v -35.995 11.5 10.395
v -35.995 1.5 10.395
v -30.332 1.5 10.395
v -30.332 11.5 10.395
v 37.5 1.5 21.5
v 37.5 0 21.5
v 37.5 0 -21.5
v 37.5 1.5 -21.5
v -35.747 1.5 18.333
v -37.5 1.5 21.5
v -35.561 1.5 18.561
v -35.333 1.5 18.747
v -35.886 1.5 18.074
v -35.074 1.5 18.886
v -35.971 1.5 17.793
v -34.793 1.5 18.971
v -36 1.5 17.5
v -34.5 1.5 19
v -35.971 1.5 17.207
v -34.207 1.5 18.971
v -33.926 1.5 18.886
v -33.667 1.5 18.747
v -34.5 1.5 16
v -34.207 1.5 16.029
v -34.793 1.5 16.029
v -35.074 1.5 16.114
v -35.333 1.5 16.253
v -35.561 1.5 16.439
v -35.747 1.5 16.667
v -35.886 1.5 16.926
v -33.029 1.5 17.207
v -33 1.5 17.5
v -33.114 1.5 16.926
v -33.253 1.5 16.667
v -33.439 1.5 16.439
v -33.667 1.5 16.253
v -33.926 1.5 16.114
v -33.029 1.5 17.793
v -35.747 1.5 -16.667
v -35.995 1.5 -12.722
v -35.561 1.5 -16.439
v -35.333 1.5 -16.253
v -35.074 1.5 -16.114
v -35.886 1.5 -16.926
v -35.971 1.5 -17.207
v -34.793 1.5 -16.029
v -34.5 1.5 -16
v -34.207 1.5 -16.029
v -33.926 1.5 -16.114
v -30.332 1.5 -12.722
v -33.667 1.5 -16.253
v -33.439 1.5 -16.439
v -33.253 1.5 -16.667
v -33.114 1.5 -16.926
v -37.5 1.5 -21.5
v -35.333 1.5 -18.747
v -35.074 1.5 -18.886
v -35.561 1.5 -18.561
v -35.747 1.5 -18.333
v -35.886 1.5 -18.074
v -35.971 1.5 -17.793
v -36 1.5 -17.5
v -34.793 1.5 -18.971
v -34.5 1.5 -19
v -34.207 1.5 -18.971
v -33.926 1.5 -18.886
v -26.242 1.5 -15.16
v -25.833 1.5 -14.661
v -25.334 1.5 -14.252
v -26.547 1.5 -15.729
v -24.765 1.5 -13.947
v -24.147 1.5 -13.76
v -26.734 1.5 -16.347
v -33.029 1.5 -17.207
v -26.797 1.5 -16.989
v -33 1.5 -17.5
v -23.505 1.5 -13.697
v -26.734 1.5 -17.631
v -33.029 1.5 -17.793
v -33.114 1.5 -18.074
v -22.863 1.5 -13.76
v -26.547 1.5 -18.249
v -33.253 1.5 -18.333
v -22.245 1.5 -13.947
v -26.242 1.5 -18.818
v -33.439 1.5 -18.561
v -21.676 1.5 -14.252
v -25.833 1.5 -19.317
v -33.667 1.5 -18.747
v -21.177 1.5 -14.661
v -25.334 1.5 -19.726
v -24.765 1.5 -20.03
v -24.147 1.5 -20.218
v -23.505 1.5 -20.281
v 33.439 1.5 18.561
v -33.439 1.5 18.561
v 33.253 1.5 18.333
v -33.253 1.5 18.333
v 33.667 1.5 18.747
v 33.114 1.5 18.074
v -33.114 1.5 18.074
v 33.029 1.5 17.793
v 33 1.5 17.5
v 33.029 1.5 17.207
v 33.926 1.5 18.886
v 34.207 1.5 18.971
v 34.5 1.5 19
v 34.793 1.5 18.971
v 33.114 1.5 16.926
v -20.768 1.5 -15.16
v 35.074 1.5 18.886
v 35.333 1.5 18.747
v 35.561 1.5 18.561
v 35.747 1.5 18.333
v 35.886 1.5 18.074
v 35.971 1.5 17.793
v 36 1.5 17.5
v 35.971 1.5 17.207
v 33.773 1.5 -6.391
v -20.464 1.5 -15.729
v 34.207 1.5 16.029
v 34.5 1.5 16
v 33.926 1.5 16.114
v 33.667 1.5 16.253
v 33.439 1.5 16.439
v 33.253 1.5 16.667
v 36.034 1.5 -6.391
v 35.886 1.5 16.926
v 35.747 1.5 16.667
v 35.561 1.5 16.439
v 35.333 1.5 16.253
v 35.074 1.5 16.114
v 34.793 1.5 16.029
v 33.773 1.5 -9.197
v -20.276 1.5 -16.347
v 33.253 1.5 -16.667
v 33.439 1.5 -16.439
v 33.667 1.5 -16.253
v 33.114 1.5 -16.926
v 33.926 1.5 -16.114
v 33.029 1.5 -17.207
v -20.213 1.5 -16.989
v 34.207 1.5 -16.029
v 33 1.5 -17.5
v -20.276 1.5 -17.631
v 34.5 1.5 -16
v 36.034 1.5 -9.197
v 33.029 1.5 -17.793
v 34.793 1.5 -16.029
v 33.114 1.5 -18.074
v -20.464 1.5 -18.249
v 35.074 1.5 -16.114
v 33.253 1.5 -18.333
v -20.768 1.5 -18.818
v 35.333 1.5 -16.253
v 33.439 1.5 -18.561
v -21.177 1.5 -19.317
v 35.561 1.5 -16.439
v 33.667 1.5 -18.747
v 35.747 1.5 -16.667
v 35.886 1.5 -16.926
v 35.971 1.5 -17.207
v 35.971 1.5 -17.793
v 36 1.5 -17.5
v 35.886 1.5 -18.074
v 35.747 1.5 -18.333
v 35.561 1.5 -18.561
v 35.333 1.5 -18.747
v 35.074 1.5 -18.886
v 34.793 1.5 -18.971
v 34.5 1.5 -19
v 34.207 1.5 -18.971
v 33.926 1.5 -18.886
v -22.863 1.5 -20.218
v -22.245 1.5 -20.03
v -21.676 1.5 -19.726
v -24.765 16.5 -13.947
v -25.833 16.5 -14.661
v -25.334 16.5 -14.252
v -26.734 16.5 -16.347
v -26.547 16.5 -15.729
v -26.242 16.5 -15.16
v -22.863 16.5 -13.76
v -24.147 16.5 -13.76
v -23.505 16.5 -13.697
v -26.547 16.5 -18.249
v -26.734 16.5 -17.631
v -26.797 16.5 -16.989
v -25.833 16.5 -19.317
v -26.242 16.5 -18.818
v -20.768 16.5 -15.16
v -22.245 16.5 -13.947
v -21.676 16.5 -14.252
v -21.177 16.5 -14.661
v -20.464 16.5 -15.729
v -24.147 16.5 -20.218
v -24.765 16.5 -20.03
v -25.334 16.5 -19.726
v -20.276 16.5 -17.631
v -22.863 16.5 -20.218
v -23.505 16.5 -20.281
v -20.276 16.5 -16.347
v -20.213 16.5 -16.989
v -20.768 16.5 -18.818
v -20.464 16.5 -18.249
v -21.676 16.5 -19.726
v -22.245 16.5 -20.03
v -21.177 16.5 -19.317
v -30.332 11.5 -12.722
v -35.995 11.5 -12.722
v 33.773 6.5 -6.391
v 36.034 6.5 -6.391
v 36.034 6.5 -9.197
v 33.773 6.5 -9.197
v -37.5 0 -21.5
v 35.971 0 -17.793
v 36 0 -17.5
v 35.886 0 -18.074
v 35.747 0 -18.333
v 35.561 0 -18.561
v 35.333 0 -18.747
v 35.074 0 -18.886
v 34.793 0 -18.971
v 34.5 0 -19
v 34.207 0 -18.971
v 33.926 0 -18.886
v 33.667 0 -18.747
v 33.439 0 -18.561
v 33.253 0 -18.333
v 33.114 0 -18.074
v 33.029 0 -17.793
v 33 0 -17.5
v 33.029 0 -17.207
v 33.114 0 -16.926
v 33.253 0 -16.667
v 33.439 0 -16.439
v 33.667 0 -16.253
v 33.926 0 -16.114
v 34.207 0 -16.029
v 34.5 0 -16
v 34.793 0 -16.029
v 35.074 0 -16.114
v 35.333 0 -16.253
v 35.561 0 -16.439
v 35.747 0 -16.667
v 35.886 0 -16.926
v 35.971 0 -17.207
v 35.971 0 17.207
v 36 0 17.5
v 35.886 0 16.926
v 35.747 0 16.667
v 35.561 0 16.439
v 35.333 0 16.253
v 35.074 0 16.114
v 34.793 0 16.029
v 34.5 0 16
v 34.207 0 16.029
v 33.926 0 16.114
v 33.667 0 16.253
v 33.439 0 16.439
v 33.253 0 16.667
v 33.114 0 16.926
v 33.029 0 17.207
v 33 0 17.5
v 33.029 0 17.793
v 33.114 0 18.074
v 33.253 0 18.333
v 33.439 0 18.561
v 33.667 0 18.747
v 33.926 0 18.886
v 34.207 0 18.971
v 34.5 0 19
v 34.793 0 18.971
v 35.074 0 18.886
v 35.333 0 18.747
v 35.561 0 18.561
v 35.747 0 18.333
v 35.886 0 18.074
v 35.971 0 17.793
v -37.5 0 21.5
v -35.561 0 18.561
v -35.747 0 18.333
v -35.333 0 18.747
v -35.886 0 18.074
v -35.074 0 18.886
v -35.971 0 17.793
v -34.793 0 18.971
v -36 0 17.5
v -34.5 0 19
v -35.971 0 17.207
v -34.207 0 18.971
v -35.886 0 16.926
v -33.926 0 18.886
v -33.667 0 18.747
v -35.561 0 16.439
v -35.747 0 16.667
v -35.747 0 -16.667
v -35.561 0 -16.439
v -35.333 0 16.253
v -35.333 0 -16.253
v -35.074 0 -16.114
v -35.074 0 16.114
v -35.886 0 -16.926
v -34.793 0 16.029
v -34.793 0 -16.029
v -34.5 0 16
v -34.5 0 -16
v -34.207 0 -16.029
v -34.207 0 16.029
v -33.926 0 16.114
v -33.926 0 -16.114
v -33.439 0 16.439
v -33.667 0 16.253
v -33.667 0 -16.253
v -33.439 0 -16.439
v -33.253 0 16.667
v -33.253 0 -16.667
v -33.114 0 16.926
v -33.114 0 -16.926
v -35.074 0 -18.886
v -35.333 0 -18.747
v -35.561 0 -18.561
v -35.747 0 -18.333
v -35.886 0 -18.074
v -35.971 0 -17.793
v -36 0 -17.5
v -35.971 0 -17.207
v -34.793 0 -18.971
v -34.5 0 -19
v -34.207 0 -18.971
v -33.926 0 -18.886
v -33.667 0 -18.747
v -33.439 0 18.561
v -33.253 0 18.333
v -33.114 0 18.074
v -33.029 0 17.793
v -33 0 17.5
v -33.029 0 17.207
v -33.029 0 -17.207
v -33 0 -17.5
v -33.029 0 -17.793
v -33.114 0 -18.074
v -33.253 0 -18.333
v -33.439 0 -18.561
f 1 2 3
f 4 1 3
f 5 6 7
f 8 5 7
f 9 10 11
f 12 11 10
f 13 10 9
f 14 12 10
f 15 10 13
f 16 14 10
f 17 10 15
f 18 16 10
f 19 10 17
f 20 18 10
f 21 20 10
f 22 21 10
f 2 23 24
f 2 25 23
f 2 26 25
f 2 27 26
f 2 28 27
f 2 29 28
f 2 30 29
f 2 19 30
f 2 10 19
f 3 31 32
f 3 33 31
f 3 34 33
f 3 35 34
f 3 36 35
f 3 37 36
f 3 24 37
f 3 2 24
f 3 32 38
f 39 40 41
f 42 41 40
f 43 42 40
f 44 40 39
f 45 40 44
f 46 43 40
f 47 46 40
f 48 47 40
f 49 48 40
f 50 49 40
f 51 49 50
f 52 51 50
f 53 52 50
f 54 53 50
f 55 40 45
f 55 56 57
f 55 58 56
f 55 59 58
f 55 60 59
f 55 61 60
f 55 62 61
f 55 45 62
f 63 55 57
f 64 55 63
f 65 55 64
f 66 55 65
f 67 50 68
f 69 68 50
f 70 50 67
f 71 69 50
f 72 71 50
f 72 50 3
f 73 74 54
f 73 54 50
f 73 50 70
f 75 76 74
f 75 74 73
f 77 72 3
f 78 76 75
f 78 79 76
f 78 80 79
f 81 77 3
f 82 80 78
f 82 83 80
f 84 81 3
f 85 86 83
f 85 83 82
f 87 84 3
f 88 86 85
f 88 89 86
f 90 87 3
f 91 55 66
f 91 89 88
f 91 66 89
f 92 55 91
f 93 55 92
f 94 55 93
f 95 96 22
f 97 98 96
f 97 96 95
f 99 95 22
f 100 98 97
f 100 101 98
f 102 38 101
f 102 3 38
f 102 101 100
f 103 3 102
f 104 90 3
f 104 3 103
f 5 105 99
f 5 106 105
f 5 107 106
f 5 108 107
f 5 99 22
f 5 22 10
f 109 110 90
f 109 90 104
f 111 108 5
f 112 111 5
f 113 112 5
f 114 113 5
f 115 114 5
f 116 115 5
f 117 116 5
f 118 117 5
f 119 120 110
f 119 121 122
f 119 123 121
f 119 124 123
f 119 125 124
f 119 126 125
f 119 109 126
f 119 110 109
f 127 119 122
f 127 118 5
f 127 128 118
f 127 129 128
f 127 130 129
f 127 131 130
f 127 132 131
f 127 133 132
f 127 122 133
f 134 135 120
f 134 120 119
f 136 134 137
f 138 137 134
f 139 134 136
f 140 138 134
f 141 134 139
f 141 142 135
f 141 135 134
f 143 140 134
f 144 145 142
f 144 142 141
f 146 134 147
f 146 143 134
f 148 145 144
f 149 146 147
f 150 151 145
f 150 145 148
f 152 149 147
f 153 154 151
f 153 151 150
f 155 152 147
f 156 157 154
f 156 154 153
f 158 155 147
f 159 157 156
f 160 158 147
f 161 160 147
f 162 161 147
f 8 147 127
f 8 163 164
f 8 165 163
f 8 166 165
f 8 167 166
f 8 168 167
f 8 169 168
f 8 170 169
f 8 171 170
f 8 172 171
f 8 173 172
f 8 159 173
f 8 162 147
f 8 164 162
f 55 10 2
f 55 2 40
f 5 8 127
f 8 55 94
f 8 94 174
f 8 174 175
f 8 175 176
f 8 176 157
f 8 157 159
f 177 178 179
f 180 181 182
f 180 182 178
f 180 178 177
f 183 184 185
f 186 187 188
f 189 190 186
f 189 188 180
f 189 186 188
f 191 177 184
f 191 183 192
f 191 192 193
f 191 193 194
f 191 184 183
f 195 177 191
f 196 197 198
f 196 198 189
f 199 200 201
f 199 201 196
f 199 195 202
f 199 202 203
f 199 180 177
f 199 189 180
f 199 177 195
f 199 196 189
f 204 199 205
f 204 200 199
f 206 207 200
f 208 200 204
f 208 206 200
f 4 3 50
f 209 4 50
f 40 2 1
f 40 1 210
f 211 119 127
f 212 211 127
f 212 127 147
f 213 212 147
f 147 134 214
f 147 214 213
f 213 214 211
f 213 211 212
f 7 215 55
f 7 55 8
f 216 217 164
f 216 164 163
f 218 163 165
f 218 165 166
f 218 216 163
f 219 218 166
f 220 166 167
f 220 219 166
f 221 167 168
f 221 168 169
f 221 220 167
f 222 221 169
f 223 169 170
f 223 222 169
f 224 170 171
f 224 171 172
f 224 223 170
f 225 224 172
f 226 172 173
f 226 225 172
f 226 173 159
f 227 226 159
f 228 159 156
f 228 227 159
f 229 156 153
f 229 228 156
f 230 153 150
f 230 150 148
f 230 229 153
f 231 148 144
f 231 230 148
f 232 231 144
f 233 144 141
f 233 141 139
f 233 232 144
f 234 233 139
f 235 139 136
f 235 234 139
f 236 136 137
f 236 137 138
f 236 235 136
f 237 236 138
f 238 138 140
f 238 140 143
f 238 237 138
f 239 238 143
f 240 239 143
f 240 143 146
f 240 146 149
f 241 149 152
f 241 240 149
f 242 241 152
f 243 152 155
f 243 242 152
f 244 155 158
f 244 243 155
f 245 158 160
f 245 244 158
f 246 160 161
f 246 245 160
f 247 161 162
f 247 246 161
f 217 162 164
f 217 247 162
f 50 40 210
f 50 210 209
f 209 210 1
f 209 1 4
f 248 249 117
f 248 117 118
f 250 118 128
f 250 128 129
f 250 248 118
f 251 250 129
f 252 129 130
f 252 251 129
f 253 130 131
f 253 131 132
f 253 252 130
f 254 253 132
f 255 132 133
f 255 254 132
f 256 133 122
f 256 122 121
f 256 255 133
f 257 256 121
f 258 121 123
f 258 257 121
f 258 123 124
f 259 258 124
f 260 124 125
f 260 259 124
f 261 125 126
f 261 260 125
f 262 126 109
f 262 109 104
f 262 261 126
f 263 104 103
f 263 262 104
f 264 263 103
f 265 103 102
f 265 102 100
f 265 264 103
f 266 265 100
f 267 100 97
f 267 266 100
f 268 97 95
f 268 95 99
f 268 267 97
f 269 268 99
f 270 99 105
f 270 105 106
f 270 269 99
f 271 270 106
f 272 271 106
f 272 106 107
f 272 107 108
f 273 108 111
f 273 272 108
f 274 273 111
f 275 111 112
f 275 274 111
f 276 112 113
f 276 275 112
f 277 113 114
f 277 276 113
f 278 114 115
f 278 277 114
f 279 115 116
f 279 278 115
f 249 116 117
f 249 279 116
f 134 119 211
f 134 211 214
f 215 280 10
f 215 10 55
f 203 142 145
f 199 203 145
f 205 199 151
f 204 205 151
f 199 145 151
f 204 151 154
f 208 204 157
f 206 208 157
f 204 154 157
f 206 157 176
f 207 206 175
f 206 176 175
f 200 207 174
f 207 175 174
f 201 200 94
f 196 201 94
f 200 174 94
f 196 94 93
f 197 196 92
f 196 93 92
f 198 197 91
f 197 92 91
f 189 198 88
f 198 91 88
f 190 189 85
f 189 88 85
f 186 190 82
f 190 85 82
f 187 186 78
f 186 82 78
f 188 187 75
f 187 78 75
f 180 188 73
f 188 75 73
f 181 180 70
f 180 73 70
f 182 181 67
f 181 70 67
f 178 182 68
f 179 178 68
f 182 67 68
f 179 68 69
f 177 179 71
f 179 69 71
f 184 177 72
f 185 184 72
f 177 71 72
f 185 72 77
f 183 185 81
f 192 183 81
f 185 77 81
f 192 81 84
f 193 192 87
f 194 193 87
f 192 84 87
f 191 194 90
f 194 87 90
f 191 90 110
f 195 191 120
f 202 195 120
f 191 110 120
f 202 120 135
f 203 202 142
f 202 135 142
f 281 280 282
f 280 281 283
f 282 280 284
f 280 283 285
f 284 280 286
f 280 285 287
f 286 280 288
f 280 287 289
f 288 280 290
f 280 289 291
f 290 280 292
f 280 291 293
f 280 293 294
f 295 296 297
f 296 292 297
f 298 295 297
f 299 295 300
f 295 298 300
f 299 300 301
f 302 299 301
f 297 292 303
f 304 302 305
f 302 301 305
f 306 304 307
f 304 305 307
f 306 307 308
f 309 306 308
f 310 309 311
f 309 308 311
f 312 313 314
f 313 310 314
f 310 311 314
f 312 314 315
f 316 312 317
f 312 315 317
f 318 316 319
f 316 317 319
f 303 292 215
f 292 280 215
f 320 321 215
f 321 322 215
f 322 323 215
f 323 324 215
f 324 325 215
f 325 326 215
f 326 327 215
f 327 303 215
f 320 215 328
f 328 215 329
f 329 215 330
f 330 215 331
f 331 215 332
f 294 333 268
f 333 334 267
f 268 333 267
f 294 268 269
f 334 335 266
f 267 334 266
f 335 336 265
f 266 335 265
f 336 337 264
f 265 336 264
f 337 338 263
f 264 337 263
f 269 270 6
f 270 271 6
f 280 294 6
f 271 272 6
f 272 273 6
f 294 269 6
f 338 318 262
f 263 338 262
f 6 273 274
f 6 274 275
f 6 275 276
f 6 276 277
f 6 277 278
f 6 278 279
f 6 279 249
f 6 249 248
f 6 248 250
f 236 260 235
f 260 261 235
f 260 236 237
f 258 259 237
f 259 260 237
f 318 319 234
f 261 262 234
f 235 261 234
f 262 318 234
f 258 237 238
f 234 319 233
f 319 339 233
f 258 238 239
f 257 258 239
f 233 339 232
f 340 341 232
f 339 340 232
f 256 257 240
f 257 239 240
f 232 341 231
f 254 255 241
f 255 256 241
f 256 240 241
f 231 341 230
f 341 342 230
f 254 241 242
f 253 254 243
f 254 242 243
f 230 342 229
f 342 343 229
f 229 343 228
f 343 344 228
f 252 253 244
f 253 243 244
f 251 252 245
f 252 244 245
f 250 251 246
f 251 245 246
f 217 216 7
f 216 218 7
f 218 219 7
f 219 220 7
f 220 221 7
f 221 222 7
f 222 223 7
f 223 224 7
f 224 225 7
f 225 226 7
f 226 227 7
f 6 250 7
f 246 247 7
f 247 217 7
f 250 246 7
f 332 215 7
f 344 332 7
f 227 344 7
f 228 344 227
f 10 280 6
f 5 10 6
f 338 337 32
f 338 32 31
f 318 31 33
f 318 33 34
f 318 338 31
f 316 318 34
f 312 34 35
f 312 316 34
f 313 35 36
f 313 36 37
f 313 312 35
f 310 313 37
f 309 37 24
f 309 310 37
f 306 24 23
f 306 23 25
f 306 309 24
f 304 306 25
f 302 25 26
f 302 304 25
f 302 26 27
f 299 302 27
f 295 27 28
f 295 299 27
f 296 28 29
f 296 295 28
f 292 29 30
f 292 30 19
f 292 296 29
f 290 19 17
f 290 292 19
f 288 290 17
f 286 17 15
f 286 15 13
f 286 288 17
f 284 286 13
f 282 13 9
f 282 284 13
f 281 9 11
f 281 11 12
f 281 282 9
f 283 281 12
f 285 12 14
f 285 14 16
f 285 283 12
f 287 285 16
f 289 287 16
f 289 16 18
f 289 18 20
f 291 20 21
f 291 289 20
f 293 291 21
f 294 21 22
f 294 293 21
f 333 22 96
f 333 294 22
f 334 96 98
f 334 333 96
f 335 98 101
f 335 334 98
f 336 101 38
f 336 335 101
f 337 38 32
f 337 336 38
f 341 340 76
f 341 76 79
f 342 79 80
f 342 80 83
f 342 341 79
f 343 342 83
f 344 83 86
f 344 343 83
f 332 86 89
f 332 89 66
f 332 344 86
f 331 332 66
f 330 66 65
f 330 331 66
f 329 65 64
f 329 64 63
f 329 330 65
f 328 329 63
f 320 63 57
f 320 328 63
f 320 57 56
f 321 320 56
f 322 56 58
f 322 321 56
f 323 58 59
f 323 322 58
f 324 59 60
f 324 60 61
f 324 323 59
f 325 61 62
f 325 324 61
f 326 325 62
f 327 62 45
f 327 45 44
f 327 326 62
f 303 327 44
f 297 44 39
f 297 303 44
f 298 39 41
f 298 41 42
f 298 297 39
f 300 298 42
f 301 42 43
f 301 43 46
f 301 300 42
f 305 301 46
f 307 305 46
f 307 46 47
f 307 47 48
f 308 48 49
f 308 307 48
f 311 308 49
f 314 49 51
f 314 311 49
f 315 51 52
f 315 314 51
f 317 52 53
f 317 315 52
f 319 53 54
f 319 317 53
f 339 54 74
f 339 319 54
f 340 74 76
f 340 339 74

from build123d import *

# Parameters (mm, degrees)
SKETCH1_W           = 75
SKETCH1_H           = 43
SKETCH1_R           = 1.5
BOSS_EXTRUDE1_DEPTH = 1.5
SKETCH3_W           = 5.662945026
SKETCH3_H           = 23.11722764
BOSS_EXTRUDE2_DEPTH = 10
SKETCH4_W           = 2.260398275
SKETCH4_H           = 2.806011651
BOSS_EXTRUDE3_DEPTH = 5
SKETCH5_R           = 3.292125191
BOSS_EXTRUDE4_DEPTH = 15


with BuildPart() as part:
    # Sketch1 → Boss-Extrude1 (new body)
    with BuildSketch(Plane(origin=(0, 0, 0), x_dir=(1, 0, 0), z_dir=(0, 1, 0))):
        Rectangle(SKETCH1_W, SKETCH1_H)
        with Locations((-34.5, 17.5)):
            Circle(SKETCH1_R, mode=Mode.SUBTRACT)
        with Locations((-34.5, -17.5)):
            Circle(SKETCH1_R, mode=Mode.SUBTRACT)
        with Locations((34.5, -17.5)):
            Circle(SKETCH1_R, mode=Mode.SUBTRACT)
        with Locations((34.5, 17.5)):
            Circle(SKETCH1_R, mode=Mode.SUBTRACT)
    extrude(amount=BOSS_EXTRUDE1_DEPTH)

    # Sketch3 → Boss-Extrude2 (add)
    with BuildSketch(Plane(origin=(0, 1.5, 0), x_dir=(1, 0, 0), z_dir=(0, 1, 0))):
        with Locations((-33.163136966, 1.163618841)):
            Rectangle(SKETCH3_W, SKETCH3_H)
    extrude(amount=BOSS_EXTRUDE2_DEPTH)

    # Sketch4 → Boss-Extrude3 (add)
    with BuildSketch(Plane(origin=(0, 1.5, 0), x_dir=(1, 0, 0), z_dir=(0, 1, 0))):
        with Locations((34.903340681, 7.794476809)):
            Rectangle(SKETCH4_W, SKETCH4_H)
    extrude(amount=BOSS_EXTRUDE3_DEPTH)

    # Sketch5 → Boss-Extrude4 (add)
    with BuildSketch(Plane(origin=(0, 1.5, 0), x_dir=(1, 0, 0), z_dir=(0, 1, 0))):
        with Locations((-23.505100586, 16.988835077)):
            Circle(SKETCH5_R)
    extrude(amount=BOSS_EXTRUDE4_DEPTH)


solid = part.part
